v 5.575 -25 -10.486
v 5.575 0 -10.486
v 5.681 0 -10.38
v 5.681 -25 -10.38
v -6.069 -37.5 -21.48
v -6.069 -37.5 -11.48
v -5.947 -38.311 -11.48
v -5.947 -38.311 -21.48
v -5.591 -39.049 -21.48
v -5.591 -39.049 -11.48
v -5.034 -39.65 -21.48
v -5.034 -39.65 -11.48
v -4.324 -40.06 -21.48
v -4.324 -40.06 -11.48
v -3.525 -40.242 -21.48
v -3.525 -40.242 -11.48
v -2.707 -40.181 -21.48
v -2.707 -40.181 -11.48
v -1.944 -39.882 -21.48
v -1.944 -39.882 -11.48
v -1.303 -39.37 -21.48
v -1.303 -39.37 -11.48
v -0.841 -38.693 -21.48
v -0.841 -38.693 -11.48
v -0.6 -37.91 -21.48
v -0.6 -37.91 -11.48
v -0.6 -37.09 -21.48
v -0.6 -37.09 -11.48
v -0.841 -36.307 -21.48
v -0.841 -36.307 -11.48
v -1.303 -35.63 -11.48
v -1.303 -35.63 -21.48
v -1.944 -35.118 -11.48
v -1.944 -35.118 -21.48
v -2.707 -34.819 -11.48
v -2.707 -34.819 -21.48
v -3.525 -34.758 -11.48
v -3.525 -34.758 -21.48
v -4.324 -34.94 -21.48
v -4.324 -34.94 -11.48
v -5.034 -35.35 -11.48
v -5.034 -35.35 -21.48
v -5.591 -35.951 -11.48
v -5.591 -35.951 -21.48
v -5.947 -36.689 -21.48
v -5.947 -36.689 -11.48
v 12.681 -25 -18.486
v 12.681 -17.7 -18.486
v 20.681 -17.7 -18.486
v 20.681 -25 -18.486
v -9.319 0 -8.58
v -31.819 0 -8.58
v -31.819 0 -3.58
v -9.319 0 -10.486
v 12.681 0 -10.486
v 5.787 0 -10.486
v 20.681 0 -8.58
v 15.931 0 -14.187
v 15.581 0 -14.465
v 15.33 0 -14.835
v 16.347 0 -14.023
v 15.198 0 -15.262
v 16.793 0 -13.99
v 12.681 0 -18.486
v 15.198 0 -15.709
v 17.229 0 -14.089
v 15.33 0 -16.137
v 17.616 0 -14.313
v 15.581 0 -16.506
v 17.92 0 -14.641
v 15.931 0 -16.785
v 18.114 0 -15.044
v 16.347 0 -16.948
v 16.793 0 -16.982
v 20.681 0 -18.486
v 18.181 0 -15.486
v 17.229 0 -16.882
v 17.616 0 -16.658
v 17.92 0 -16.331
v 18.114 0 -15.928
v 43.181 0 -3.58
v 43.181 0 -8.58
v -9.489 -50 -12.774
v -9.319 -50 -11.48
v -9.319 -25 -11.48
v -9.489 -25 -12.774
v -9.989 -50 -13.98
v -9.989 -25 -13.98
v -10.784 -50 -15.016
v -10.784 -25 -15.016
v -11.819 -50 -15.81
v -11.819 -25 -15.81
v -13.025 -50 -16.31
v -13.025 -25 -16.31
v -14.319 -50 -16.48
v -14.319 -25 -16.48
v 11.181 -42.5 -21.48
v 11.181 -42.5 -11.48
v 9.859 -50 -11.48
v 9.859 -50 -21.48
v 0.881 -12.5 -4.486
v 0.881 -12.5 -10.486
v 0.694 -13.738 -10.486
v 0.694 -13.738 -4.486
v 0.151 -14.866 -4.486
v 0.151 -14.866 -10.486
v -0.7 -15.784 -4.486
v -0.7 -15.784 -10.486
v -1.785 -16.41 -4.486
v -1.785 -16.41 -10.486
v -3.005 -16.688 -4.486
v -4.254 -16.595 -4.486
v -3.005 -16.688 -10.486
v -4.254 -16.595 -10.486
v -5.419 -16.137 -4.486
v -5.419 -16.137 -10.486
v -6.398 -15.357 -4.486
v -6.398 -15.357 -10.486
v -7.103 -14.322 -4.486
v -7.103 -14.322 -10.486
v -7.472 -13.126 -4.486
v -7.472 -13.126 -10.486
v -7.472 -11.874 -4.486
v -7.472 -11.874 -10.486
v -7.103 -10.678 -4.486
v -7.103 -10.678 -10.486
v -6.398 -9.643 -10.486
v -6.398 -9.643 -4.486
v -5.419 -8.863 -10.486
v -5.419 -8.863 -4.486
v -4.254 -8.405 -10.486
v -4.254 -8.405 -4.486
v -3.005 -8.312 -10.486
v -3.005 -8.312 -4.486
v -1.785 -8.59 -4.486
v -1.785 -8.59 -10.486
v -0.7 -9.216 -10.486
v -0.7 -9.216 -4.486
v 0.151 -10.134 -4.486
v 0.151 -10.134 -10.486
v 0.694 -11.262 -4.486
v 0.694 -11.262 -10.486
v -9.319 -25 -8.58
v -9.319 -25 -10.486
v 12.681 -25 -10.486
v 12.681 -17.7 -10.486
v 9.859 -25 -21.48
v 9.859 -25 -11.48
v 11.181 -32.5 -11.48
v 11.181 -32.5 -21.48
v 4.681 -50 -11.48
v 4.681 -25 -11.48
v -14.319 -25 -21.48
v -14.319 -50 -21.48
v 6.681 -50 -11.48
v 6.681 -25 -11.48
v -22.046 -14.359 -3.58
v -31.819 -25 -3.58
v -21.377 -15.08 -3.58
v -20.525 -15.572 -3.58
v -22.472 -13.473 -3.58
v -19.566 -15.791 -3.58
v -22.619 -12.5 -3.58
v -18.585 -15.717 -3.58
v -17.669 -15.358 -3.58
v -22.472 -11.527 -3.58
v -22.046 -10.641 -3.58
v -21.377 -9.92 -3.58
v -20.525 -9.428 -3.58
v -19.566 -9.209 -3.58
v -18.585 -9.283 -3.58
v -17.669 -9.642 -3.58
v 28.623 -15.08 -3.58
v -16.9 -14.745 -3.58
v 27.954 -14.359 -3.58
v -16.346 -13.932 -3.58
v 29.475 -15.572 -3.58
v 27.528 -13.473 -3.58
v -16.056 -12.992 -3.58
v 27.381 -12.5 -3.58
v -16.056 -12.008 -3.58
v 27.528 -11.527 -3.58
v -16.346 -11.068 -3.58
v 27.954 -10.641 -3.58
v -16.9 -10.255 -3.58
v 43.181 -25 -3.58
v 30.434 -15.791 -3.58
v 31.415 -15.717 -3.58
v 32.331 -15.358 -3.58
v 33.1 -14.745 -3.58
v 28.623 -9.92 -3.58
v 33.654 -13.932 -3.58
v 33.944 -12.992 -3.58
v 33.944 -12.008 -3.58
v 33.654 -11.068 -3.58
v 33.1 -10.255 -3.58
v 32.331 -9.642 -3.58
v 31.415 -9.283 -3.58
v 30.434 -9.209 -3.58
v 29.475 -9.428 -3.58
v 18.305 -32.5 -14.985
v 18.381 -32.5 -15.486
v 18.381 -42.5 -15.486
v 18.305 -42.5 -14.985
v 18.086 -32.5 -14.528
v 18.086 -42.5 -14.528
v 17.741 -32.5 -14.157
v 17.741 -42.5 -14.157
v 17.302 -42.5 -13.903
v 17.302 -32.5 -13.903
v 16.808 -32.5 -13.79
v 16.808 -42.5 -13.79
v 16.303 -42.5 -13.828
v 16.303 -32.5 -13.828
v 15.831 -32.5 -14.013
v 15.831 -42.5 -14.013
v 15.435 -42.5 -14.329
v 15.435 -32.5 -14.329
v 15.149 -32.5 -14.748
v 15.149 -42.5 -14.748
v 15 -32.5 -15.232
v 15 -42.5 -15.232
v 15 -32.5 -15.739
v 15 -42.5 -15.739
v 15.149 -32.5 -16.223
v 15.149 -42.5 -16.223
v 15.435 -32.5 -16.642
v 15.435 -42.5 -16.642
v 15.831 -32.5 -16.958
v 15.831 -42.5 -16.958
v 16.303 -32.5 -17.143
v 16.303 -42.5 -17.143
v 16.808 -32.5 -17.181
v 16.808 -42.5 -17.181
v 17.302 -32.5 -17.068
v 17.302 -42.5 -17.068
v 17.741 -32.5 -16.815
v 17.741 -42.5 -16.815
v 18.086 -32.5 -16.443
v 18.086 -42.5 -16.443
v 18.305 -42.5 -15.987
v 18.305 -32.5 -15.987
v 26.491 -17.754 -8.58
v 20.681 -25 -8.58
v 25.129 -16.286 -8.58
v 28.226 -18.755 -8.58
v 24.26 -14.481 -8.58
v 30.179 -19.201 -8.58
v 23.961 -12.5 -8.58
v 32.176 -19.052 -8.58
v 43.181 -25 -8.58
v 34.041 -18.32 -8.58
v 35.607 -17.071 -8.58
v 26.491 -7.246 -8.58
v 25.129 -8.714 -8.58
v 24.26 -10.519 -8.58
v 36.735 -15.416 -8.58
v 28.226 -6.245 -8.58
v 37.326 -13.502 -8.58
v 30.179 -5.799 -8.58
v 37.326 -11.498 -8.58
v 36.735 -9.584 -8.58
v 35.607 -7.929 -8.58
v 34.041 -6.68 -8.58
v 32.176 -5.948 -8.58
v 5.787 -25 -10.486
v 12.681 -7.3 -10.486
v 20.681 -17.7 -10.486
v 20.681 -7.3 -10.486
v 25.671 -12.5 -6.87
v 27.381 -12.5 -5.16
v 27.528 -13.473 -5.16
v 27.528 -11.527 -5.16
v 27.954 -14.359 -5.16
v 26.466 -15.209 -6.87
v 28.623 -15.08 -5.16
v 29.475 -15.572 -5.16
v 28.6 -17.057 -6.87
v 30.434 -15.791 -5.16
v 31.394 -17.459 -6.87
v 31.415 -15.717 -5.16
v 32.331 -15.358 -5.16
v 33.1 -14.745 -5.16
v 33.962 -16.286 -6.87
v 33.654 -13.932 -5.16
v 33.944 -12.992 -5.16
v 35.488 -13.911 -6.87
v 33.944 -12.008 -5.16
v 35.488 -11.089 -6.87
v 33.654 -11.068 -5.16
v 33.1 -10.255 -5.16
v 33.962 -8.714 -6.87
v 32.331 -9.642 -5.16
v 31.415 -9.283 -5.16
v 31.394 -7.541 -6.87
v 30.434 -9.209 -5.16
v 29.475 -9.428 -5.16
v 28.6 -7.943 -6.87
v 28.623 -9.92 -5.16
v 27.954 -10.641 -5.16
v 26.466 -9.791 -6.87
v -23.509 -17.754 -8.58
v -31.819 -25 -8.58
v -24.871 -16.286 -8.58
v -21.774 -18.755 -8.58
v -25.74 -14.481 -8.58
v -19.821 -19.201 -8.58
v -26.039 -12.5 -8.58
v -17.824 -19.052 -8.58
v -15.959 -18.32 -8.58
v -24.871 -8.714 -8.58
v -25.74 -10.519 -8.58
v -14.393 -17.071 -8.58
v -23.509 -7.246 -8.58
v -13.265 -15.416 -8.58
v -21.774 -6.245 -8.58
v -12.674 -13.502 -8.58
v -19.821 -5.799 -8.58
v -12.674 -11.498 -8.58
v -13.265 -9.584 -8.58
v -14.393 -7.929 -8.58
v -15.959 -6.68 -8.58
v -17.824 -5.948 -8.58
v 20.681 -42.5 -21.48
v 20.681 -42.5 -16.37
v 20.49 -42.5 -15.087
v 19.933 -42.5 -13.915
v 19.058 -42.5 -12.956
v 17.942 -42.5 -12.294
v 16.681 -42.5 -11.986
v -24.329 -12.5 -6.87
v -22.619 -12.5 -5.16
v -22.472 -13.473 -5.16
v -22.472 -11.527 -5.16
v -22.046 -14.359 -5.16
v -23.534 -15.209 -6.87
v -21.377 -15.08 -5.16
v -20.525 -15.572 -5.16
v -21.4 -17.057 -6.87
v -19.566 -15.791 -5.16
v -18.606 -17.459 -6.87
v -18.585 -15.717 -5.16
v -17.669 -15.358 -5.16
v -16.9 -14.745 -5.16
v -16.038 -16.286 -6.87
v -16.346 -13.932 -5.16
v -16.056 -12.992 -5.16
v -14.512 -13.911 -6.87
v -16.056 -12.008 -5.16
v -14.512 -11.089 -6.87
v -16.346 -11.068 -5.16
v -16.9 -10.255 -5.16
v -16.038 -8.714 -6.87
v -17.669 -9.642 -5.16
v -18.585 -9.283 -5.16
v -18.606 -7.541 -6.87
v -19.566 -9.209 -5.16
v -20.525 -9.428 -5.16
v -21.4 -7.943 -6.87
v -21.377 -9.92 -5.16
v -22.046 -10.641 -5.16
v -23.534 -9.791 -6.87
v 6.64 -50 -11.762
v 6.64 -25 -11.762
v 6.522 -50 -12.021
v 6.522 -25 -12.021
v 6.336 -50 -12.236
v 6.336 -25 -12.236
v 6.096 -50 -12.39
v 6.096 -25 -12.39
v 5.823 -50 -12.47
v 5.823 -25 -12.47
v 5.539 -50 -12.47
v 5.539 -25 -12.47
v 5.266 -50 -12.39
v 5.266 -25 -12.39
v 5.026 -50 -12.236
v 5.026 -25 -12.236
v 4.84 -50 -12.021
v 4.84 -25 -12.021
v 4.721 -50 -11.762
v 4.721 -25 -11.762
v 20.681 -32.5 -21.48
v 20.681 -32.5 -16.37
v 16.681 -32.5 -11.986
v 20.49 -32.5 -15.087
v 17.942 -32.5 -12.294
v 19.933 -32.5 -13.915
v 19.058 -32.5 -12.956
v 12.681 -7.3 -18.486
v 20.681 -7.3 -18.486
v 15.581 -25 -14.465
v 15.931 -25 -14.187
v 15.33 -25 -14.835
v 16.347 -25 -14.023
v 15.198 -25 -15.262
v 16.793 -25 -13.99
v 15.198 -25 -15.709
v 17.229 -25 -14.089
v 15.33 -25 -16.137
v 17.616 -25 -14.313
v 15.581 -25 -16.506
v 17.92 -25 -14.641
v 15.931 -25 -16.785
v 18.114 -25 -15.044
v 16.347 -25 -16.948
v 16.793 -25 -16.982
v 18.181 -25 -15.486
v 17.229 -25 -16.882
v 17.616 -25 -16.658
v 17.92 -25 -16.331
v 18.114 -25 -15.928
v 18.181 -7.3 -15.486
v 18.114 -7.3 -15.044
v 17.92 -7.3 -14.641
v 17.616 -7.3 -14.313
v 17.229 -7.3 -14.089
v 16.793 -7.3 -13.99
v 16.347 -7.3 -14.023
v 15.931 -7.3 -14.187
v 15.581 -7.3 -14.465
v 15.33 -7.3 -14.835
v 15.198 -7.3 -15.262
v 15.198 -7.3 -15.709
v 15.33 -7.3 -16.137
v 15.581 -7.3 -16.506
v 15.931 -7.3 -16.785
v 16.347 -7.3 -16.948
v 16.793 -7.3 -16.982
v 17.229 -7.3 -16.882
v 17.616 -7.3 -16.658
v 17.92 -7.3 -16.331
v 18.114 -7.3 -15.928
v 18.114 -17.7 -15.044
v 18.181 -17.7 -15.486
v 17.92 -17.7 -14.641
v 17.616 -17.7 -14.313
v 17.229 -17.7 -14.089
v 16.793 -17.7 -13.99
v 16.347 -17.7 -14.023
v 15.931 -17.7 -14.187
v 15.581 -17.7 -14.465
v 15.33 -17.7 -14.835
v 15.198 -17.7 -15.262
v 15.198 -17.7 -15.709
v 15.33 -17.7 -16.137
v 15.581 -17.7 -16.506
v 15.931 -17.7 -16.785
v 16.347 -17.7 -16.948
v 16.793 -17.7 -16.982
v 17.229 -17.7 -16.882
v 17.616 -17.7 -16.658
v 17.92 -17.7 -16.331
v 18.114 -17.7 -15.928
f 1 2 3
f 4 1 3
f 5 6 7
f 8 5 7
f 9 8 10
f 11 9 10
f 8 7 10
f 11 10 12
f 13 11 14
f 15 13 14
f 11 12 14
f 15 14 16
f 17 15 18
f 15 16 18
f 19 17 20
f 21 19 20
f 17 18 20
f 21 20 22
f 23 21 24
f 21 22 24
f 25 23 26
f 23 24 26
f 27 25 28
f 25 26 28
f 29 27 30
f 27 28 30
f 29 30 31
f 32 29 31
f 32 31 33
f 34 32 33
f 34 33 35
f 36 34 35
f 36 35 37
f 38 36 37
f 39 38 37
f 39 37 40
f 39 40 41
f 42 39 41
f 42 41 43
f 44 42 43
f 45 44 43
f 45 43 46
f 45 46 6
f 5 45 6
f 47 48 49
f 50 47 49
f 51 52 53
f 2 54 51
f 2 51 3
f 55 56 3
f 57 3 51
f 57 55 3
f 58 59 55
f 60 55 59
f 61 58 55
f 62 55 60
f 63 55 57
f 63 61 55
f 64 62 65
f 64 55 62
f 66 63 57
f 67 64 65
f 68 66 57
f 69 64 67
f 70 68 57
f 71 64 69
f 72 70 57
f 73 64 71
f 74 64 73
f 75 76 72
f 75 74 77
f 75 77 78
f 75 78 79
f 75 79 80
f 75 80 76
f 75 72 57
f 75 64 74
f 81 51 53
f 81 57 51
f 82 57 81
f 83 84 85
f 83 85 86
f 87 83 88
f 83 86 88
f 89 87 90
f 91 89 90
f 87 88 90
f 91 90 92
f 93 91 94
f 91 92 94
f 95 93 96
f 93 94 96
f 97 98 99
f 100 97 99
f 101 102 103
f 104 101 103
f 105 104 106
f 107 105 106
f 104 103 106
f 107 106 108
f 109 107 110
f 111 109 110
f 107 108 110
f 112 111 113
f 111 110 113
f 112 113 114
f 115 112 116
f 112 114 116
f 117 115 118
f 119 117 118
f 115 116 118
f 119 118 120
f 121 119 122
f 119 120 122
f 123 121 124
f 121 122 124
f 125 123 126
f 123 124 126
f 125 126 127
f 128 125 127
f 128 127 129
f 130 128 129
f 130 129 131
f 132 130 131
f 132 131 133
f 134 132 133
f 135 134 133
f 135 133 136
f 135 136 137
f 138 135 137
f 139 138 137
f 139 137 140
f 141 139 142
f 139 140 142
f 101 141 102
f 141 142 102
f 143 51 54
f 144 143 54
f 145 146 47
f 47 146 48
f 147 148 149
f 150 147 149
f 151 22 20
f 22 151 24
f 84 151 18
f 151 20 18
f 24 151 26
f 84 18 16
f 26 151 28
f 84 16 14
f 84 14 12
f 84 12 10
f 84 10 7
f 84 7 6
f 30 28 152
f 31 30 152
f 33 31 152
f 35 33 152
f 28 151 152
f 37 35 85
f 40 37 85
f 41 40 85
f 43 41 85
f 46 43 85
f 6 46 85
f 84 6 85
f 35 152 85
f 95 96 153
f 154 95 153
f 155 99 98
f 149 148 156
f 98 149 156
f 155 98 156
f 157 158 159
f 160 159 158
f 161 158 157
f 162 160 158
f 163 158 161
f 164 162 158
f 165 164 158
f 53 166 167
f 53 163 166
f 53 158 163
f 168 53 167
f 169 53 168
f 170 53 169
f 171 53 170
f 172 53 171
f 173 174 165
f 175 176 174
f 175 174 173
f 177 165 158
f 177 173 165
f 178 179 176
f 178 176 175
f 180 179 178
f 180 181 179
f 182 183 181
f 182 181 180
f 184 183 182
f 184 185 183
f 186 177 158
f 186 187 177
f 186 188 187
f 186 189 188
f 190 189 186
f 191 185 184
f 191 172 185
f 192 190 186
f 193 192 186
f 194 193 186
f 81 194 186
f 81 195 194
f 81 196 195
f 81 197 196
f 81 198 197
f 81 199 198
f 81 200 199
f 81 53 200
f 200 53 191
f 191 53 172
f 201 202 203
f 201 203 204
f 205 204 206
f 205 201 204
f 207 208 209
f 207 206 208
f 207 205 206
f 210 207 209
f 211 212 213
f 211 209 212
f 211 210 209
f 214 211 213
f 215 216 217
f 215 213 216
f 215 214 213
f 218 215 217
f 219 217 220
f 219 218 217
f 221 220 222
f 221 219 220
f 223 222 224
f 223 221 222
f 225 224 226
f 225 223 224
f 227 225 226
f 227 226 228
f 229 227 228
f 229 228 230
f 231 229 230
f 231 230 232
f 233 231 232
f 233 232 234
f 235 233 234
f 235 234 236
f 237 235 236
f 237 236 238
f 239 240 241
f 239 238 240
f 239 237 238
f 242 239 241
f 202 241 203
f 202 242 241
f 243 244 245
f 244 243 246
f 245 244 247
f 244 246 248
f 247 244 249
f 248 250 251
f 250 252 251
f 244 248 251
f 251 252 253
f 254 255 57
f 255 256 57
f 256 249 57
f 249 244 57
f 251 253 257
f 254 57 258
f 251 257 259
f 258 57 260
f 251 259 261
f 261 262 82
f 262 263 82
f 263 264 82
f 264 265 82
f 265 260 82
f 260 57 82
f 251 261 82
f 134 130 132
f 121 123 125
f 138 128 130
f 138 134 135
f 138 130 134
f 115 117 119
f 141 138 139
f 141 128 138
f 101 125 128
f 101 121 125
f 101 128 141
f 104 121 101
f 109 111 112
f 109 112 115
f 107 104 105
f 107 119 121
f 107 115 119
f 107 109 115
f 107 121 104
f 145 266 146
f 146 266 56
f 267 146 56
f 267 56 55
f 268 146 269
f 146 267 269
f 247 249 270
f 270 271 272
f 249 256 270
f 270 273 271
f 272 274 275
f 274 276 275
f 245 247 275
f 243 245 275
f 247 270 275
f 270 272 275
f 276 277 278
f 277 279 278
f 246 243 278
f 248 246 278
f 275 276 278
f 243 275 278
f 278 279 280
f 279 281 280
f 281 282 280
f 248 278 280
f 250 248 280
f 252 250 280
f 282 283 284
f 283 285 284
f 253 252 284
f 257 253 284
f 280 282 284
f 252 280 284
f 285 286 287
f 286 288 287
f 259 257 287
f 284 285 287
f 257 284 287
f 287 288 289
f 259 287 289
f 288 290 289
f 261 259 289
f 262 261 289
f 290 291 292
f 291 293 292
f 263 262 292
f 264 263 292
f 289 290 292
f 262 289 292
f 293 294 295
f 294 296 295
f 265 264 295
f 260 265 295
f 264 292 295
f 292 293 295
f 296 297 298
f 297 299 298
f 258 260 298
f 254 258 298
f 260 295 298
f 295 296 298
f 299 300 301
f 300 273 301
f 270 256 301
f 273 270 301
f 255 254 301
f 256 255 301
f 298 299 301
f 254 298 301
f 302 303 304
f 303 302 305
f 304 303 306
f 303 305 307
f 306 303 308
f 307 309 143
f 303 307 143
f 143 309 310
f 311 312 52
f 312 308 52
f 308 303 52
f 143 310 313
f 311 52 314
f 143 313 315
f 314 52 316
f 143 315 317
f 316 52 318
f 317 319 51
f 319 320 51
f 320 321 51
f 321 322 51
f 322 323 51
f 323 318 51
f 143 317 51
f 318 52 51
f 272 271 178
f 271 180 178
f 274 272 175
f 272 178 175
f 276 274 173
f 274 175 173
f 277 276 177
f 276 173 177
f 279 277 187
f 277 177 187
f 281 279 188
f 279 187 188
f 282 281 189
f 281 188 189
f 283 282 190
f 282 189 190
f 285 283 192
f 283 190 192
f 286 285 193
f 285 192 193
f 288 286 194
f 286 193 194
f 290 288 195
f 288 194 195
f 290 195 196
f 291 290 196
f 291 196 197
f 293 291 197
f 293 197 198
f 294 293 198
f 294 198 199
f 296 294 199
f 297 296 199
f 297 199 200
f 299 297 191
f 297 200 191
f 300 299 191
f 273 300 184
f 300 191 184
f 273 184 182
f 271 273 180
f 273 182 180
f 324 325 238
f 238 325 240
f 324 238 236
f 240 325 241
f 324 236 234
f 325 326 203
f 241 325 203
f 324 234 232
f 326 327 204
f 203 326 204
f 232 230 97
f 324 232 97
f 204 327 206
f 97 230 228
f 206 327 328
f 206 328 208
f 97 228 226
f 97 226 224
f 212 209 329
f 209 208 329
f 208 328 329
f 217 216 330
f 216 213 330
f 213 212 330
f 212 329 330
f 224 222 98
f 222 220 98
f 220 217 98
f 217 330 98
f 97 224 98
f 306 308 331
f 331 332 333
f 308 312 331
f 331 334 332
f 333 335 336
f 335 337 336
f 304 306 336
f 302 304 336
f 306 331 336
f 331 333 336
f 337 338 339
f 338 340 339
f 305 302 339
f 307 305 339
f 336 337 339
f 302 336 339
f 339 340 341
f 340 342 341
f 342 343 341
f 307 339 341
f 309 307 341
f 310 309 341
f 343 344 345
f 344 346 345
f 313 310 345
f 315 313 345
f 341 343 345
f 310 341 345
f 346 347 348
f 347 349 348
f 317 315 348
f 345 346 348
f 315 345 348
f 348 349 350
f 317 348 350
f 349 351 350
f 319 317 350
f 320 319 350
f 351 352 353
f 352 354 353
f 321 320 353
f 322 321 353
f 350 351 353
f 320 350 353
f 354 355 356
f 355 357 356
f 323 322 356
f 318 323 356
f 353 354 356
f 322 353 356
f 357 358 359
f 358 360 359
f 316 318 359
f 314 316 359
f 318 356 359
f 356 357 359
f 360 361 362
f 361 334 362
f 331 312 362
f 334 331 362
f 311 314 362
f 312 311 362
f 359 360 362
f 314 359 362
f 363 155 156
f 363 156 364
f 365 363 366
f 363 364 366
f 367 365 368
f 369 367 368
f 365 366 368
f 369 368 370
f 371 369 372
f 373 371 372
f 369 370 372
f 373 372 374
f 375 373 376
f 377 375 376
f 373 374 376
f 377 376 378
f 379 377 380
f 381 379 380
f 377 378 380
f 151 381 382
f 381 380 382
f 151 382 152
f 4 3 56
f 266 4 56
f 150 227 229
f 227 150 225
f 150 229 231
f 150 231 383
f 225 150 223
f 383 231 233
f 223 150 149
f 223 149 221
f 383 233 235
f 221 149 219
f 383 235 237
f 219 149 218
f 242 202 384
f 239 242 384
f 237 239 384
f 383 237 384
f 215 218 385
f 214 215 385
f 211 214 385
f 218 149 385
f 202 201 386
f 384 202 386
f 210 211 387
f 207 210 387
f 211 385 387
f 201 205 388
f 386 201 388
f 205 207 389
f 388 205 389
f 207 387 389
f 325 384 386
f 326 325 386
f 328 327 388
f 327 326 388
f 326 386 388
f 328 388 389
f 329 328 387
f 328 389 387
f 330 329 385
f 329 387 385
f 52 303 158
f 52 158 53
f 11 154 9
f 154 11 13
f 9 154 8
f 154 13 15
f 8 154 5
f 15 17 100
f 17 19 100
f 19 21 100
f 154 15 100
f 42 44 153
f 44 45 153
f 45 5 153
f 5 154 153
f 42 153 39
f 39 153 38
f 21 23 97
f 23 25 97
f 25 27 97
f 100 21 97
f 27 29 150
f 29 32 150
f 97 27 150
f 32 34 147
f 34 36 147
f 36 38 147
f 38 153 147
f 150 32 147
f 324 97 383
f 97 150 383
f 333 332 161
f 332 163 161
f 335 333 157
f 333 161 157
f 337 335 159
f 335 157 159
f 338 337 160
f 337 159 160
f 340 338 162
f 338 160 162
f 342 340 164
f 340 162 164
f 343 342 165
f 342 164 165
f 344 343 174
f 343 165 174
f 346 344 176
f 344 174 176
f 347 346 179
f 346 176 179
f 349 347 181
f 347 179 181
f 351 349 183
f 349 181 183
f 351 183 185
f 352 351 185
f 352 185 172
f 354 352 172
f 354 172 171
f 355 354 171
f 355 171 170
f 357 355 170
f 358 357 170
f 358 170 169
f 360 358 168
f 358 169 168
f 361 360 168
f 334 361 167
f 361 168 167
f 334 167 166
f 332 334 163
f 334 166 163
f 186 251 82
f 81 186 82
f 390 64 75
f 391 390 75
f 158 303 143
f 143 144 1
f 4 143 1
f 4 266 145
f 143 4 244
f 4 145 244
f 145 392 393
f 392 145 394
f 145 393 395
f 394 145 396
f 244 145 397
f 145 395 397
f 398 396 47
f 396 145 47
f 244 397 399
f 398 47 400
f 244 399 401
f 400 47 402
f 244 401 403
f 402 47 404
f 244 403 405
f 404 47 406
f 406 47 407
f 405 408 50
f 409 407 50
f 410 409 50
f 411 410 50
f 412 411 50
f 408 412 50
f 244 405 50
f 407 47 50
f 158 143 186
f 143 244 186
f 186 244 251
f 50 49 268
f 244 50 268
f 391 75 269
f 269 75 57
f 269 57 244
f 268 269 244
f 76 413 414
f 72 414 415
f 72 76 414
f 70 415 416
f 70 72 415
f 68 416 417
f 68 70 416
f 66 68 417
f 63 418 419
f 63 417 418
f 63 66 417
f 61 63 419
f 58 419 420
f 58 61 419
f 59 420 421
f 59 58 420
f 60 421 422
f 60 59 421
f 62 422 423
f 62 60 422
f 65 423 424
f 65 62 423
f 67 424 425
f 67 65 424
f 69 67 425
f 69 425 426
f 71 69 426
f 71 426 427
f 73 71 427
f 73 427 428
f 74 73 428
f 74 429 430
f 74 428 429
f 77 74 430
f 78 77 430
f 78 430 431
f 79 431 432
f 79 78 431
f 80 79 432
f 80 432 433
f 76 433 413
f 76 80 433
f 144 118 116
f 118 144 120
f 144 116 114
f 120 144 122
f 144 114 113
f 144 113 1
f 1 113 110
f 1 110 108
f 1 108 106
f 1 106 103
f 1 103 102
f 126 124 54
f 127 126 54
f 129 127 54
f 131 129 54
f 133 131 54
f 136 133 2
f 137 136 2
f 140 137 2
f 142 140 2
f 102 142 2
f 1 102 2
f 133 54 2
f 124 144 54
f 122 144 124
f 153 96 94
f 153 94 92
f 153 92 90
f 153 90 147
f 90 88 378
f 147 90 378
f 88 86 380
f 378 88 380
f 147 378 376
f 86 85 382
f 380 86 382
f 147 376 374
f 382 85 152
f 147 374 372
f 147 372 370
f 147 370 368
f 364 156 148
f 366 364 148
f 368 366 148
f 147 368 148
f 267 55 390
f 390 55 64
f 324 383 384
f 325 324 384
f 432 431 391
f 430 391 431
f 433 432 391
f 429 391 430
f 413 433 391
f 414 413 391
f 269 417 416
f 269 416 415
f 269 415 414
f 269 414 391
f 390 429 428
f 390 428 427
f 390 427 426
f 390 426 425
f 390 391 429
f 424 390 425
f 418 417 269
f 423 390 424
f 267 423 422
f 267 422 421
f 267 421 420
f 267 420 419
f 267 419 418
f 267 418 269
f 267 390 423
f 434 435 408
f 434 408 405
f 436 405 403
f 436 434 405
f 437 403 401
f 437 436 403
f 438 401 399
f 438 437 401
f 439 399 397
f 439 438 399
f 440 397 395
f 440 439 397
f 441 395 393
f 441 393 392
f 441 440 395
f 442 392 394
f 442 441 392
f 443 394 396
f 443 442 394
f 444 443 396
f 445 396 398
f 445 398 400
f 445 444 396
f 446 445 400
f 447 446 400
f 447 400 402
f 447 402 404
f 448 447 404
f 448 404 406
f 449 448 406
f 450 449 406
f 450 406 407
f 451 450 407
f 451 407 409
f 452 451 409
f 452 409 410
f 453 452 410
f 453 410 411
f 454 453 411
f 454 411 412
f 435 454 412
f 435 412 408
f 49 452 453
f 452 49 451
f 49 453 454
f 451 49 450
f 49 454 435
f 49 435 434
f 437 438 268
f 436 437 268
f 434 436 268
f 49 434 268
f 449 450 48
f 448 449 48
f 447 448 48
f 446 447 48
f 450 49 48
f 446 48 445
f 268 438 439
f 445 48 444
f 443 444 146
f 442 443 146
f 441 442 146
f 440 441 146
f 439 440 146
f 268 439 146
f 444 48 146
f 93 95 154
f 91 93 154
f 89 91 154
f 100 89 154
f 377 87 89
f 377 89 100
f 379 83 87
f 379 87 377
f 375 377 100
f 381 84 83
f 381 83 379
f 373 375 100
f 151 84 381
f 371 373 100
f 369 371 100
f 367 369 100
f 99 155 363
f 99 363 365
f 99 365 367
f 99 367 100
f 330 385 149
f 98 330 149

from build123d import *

# Parameters (mm, degrees)
F0_R           = 1.5
F1_DEPTH       = 25
F3_W           = 75
F3_H           = 25
F4_DEPTH       = 5
F2_R           = 4.2
F5_DEPTH       = 6
F6_D           = 6.6
F6_CSINK_D     = 13.44
F6_CSINK_ANGLE = 90
F7_W           = 10.4
F7_H           = 8
F8_DEPTH       = 25
F9_R           = 1.7
F10_DEPTH      = 25
F12_D          = 5.5
F14_DEPTH      = 10.001


with BuildPart() as f1:
    # F0 (on Front) → F1 (new body)
    with BuildSketch(Plane.XZ):
        Polygon((5.7870310192, -10.4857282235), (12.6809650045, -10.4857282235), (12.6809650045, -18.4857282235), (20.6809650045, -18.4857282235), (20.6809650045, -8.5796622039), (-9.3190349955, -8.5796622039), (-9.3190349955, -10.4857282235), (5.5748989899, -10.4857282235), (5.6809650045, -10.3796622039), align=None)
        with Locations((16.6809650045, -15.4857282235)):
            Circle(F0_R, mode=Mode.SUBTRACT)
    extrude(amount=F1_DEPTH)

    # F3 (on face) → F4 (join)
    with BuildSketch(Plane.XY.offset(-8.5796622039)):
        with Locations((5.6809650045, -12.5)):
            Rectangle(F3_W, F3_H)
    extrude(amount=F4_DEPTH)

    # F2 (on face) → F5 (cut)
    with BuildSketch(Plane(origin=(0, 0, -10.4857282235), x_dir=(1, 0, 0), z_dir=(0, 0, -1))):
        with Locations((-3.3190349955, 12.5)):
            Circle(F2_R)
    extrude(amount=-F5_DEPTH, mode=Mode.SUBTRACT)

    # F6 (through all)
    with Locations(Plane(origin=(0, 0, -8.5796622039), x_dir=(1, 0, 0), z_dir=(0, 0, -1))):
        with Locations((30.6809650045, 12.5), (-19.3190349955, 12.5)):
            CounterSinkHole(F6_D / 2, F6_CSINK_D / 2, counter_sink_angle=F6_CSINK_ANGLE)

    # F7 (on face) → F8 (cut)
    with BuildSketch(Plane(origin=(12.6809650045, 0, 0), x_dir=(0, -1, 0), z_dir=(-1, 0, 0))):
        with Locations((12.5, -14.4857282235)):
            Rectangle(F7_W, F7_H)
    extrude(amount=-F8_DEPTH, mode=Mode.SUBTRACT)


with BuildPart() as f10:
    # F9 (on face) → F10 (new body)
    with BuildSketch(Plane.XZ.offset(25)):
        with BuildLine():
            ThreePointArc((6.6809650045, -11.4800873139), (5.6809650045, -12.4800873139), (4.6809650045, -11.4800873139))
            Line((4.6809650045, -11.4800873139), (-9.3190349955, -11.4800873139))
            ThreePointArc((-9.3190349955, -11.4800873139), (-10.7835010895, -15.0156212198), (-14.3190349955, -16.4800873139))
            Line((-14.3190349955, -16.4800873139), (-14.3190349955, -21.4800873139))
            Line((-14.3190349955, -21.4800873139), (20.6809650045, -21.4800873139))
            Line((20.6809650045, -21.4800873139), (20.6809650045, -16.3703354811))
            ThreePointArc((20.6809650045, -16.3703354811), (19.5307235765, -13.4028120691), (16.6809650045, -11.9857282235))
            Line((16.6809650045, -11.9857282235), (11.1809650045, -11.4800873139))
            Line((11.1809650045, -11.4800873139), (6.6809650045, -11.4800873139))
        make_face()
        with Locations((16.6809650045, -15.4857282235)):
            Circle(F9_R, mode=Mode.SUBTRACT)
    extrude(amount=F10_DEPTH)

    # F12 (through all)
    with Locations(Plane(origin=(0, 0, -21.4800873139), x_dir=(1, 0, 0), z_dir=(0, 0, -1))):
        with Locations((-3.3190349955, 37.5)):
            Hole(F12_D / 2)

    # F13 (on face) → F14 (cut, through all)
    with BuildSketch(Plane.XY.offset(-11.4800873139)):
        Polygon((39.8585126492, -25), (9.8585126492, -25), (11.1809650045, -32.5), (39.8585126492, -32.5), align=None)
        Polygon((11.1809650045, -42.5), (9.8585126492, -50), (39.8585126492, -50), (39.8585126492, -42.5), align=None)
    extrude(amount=-F14_DEPTH, mode=Mode.SUBTRACT)


solid = Compound([f1.part, f10.part])
